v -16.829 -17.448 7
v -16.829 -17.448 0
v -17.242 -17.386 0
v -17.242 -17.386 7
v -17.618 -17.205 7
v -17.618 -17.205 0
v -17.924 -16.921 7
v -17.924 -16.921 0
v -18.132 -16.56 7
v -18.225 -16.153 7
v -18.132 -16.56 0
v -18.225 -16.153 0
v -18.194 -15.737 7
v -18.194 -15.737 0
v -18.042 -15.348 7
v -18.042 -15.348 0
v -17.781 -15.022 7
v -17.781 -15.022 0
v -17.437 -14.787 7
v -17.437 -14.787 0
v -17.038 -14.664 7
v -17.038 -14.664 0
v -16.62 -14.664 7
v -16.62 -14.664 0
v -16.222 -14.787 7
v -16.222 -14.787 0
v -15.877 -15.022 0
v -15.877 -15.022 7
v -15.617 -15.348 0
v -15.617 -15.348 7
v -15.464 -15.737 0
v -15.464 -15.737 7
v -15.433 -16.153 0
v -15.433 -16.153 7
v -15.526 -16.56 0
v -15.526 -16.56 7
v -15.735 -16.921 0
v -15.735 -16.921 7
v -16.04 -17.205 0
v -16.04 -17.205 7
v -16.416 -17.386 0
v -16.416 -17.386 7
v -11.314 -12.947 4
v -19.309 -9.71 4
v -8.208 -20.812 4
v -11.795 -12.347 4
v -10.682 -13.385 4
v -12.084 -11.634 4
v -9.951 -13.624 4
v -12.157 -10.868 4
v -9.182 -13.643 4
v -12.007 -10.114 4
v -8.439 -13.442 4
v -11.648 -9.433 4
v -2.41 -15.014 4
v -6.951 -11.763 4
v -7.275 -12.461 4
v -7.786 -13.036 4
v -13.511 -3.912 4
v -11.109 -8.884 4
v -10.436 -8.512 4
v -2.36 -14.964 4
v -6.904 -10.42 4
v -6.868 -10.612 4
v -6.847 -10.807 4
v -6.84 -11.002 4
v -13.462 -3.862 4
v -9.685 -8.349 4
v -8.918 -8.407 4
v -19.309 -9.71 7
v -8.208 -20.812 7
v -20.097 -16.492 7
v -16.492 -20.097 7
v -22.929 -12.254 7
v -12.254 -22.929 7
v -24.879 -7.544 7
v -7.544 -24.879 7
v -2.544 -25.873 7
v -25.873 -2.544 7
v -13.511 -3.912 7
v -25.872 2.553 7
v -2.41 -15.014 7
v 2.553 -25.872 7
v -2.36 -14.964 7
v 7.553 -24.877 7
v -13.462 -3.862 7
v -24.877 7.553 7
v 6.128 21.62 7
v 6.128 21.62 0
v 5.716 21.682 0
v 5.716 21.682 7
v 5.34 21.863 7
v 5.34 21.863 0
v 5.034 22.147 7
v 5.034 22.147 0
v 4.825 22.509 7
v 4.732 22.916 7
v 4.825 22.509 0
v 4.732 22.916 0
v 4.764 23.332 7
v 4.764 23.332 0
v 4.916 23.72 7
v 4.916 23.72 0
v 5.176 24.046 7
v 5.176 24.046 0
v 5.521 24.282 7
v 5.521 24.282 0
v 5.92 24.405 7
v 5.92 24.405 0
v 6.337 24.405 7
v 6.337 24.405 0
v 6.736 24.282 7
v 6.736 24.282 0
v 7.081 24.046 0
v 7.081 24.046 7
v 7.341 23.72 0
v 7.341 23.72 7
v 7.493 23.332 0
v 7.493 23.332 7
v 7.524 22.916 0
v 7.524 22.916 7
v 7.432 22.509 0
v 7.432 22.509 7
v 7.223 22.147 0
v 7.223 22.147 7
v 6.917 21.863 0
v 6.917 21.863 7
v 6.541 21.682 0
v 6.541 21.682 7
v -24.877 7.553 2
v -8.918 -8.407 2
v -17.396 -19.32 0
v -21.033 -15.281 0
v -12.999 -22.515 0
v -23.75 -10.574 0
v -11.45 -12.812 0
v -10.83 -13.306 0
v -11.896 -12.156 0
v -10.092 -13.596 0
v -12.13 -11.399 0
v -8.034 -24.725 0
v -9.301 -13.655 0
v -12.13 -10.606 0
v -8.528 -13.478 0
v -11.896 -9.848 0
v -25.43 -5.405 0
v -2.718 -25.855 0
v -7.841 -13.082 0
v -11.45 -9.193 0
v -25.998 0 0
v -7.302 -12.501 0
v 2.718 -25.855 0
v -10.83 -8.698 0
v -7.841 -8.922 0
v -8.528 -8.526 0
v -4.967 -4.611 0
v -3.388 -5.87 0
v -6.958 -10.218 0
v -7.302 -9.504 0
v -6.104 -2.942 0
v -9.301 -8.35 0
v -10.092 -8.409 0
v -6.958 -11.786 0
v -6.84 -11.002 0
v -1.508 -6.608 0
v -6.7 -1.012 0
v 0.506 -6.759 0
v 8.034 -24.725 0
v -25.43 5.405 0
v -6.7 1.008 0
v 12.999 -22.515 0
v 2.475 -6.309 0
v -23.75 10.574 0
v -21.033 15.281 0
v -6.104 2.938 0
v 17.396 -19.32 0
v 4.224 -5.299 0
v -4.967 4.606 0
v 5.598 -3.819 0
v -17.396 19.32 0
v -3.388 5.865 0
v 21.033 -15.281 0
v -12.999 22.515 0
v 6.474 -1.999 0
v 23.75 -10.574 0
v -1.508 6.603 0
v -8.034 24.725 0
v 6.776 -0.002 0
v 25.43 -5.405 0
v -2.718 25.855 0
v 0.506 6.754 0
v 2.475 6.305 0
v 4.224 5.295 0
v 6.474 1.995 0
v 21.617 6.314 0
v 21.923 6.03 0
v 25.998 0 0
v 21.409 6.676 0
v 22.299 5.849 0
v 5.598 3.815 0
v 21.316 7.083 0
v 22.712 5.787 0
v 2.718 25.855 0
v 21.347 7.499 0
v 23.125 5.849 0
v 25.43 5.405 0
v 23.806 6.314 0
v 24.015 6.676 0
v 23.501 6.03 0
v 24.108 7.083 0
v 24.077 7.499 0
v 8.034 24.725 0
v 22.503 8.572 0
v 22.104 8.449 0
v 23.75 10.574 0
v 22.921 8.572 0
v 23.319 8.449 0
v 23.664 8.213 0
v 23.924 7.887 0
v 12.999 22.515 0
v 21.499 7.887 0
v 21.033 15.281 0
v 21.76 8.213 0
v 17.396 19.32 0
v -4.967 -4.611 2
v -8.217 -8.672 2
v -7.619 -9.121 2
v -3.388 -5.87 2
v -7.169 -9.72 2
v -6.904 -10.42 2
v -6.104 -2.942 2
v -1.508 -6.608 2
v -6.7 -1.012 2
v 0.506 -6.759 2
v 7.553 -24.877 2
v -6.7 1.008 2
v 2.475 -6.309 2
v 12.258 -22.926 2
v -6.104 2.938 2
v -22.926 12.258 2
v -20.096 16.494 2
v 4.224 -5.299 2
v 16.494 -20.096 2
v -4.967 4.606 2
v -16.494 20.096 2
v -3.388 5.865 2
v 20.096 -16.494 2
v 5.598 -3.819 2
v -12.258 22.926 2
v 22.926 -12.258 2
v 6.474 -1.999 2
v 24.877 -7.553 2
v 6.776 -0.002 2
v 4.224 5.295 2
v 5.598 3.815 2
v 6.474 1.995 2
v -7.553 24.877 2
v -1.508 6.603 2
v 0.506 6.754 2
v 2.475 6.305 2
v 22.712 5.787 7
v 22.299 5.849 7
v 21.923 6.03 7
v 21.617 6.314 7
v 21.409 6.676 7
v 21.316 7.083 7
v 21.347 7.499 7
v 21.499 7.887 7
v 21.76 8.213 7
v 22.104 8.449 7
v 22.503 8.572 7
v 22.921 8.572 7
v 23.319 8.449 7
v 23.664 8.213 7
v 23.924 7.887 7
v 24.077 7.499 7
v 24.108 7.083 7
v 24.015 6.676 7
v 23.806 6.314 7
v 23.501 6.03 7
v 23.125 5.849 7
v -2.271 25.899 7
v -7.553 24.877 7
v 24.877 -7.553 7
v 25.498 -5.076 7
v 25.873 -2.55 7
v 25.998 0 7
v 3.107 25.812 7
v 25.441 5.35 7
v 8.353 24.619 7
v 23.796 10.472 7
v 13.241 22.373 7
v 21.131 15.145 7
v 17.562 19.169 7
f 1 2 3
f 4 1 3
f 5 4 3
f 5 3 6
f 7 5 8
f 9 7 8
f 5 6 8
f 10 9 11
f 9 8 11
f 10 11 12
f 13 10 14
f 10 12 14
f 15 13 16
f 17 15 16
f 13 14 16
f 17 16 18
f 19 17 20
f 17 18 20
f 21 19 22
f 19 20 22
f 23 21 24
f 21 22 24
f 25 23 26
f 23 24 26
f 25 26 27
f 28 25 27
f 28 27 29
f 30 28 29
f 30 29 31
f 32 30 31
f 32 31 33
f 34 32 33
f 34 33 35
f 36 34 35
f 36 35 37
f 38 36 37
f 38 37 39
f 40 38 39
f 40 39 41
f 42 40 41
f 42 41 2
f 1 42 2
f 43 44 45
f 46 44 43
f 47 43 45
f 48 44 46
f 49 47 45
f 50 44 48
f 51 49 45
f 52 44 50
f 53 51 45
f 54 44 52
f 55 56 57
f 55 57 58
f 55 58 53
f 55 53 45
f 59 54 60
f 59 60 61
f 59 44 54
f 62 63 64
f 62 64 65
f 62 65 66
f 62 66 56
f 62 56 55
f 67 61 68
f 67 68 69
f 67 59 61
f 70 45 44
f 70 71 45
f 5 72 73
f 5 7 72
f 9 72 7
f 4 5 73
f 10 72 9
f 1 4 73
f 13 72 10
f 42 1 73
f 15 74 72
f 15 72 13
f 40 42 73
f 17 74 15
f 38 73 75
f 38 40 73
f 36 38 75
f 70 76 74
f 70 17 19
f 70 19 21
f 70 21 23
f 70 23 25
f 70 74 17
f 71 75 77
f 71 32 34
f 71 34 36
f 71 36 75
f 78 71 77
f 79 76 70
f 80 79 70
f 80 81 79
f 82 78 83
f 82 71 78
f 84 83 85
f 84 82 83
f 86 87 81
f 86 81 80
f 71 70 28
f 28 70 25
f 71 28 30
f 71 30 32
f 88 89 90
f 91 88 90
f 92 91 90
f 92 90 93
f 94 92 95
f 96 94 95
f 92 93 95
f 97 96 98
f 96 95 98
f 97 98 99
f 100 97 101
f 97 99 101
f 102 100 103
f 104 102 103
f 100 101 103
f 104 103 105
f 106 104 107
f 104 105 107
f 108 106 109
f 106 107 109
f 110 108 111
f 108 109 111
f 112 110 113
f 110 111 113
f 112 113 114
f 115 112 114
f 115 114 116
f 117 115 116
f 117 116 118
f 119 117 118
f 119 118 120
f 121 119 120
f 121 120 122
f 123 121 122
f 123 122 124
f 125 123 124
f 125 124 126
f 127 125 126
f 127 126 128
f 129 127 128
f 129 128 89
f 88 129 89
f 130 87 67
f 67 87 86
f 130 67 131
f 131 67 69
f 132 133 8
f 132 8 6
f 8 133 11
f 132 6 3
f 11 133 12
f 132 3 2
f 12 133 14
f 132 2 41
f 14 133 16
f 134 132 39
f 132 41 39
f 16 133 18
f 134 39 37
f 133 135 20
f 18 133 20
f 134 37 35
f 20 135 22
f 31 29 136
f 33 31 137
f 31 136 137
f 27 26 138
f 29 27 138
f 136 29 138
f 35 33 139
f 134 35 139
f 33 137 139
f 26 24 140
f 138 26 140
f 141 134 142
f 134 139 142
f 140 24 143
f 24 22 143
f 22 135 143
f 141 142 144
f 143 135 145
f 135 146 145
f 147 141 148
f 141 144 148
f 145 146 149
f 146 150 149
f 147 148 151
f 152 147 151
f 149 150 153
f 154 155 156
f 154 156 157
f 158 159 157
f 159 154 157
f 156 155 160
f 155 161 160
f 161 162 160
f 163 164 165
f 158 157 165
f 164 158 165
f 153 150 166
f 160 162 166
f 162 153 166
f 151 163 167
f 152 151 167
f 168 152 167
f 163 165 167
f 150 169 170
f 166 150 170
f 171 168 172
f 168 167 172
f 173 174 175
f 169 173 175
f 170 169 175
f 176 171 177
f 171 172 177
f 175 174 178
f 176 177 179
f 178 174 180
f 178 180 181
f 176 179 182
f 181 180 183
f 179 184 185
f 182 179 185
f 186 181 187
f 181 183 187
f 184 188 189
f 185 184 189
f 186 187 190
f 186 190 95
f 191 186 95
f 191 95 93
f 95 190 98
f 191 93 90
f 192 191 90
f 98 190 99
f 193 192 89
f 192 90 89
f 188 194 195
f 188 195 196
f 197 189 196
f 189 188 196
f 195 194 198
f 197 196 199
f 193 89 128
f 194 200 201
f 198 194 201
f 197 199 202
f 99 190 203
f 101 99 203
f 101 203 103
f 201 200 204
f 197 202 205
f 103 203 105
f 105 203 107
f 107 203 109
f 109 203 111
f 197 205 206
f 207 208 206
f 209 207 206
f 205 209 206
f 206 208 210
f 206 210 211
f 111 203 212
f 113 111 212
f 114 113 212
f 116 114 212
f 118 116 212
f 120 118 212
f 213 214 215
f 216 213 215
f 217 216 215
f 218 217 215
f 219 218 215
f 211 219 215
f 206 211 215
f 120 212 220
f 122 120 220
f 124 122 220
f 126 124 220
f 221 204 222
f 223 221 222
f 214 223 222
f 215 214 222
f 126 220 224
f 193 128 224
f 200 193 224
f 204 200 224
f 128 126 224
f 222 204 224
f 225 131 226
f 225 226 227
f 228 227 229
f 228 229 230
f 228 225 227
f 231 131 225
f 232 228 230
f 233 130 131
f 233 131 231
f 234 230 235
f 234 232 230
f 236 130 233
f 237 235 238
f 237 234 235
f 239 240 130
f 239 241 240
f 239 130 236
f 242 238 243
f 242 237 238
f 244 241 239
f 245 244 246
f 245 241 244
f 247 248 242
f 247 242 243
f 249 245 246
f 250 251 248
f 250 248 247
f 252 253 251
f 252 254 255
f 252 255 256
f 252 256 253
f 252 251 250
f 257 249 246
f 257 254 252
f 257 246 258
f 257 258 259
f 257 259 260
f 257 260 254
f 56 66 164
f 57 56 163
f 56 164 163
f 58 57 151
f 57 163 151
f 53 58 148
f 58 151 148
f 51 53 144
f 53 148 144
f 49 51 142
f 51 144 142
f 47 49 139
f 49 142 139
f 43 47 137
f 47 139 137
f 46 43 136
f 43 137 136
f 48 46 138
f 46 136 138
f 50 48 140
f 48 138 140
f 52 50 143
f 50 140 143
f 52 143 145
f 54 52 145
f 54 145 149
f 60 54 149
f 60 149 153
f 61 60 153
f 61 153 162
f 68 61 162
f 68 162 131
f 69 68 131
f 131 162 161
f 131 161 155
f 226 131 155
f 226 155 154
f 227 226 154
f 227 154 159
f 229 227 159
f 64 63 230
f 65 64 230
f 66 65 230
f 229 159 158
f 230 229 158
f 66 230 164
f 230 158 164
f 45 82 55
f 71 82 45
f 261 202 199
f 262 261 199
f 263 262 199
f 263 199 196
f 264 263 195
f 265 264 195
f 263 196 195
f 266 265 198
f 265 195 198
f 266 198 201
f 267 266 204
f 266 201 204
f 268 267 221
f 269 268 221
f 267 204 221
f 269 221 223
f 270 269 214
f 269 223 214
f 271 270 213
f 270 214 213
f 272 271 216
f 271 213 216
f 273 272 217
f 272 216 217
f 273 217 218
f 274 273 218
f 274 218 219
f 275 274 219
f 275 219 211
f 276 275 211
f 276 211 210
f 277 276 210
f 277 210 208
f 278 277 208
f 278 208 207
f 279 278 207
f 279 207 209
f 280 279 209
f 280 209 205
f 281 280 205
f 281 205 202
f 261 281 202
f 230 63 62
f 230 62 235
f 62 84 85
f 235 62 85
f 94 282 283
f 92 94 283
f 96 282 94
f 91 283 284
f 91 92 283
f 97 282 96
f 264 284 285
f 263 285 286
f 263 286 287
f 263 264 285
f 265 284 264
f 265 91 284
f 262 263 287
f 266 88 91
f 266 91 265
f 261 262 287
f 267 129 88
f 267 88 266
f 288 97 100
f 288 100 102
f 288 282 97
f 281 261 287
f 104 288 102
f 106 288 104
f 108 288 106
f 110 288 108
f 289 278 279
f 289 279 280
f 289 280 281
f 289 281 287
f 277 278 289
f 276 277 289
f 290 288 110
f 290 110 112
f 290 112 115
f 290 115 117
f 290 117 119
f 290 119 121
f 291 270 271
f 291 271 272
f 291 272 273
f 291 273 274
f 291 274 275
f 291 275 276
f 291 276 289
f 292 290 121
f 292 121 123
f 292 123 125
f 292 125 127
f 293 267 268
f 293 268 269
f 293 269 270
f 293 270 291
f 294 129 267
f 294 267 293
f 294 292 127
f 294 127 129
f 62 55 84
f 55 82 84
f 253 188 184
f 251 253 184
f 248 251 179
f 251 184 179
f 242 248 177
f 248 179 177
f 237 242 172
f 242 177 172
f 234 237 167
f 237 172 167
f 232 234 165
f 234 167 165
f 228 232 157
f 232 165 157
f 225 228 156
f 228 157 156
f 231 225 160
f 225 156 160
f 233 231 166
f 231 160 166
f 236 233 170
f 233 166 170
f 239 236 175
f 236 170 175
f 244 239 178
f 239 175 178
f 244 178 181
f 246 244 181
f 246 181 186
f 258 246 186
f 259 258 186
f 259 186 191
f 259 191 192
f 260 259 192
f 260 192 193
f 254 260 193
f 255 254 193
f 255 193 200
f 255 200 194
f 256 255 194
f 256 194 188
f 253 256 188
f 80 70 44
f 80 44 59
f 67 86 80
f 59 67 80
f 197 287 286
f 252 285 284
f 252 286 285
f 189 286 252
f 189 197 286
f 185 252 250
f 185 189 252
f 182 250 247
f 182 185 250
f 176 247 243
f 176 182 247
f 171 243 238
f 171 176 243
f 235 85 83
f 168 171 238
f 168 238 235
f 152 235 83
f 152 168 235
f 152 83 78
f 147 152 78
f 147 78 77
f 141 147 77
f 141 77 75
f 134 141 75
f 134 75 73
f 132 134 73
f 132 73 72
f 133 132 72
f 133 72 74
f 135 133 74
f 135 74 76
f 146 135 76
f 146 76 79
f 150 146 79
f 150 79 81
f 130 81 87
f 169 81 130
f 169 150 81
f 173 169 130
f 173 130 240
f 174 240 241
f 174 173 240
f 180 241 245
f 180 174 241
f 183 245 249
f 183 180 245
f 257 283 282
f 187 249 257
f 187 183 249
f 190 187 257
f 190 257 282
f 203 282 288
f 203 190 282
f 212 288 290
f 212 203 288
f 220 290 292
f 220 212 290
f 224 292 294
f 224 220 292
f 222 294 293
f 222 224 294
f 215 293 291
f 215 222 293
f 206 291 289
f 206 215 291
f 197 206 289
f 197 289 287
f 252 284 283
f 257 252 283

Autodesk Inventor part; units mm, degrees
ref_plane "YZ Plane" through (0, 0, 0) normal (1, 0, 0) x (0, 1, 0)
ref_plane "XZ Plane" through (0, 0, 0) normal (0, 1, 0) x (-1, 0, 0)
ref_plane "XY Plane" through (0, 0, 0) normal (0, 0, 1) x (1, 0, 0)
ref_plane "Work Plane1" through (0, 0, 0) normal (0, 0, 1) x (1, 0, 0)
sketch "Sketch1" plane through (0, 0, 0) normal (0, 0, 1) x (1, 0, 0)
  circle A0 centre (0, 0) radius 25.9979 projected
  circle A1 centre (-9.4998, -11.0022) radius 2.6601 projected
  circle A2 centre (0.0001, -0.0022) radius 3.8801 projected
  circle A3 centre (0.0001, -0.0022) radius 6.7754 projected
  point P0 (0, 0)
extrude "Extrusion1" add sketch "Sketch1" along normal blind 7 contours A0
sketch "Sketch2" plane through (0, 0, 7) normal (0, 0, 1) x (1, 0, 0)
  line L0 (32.4435, -15.1193) -> (-15.1193, 32.4435)
  line L1 (-15.1193, 32.4435) -> (-32.4435, 15.1193)
  line L2 (-32.4435, 15.1193) -> (15.1193, -32.4435)
  line L3 (15.1193, -32.4435) -> (32.4435, -15.1193)
  line L4 (32.4435, -15.1193) -> (-32.4435, 15.1193) construction
  line L5 (-15.1193, 32.4435) -> (15.1193, -32.4435) construction
  line L6 (32.4435, -15.1193) -> (99.7074, -15.1193) construction
  point P0 (0, 0)
  dimension "d2" = 135
  dimension "d3" = 24.5
extrude "Extrusion2" cut sketch "Sketch2" against normal blind 5
sketch "Sketch3" plane through (0, 0, 7) normal (0, 0, 1) x (1, 0, 0)
  line L0 (-7.7936, -20.2561) -> (-2.9652, -15.4277) projected
  line L1 (-18.7537, -9.2959) -> (-13.9253, -4.4675) projected
  line L2 (-13.5111, -3.9119) -> (-2.4095, -15.0135)
  line L3 (-2.4095, -15.0135) -> (-8.2078, -20.8117)
  line L4 (-8.2078, -20.8117) -> (-19.3094, -9.7102)
  line L5 (-19.3094, -9.7102) -> (-13.5111, -3.9119)
  line L6 (-8.9176, -8.4066) -> (-24.8767, 7.5526) projected
  line L7 (-13.4617, -3.8624) -> (-2.4095, -15.0135)
  line L8 (-2.4095, -15.0135) -> (-0.3384, -12.9607)
  line L9 (-0.3384, -12.9607) -> (-11.3905, -1.8096)
  line L10 (-11.3905, -1.8096) -> (-13.4617, -3.8624)
  line L11 (-13.4617, -3.8624) -> (-13.5111, -3.9119)
  line L12 (-8.9176, -8.4066) -> (-24.8767, 7.5526) projected
  line L13 (-13.9253, -4.4675) -> (-2.9652, -15.4277) projected
  line L14 (-7.7936, -20.2561) -> (-18.7537, -9.2959) projected
  point P0 (0, 0)
  dimension "d6" = 0.1
extrude "Extrusion3" cut sketch "Sketch3" against normal blind 3 contours L14 L1 L13 L0 | L11 L7 L2 | L2 L3 L4 L5 | L7 L10 L9 L8
sketch "Skizze4" plane through (0, 0, 7) normal (0, 0, 1) x (1, 0, 0)
  spline S0 degree 2 poles (24.1427, 2.2394) (24.731, 1.8489) (25.3785, 0.5587) (25.3785, -0.3311) knots 0 0 0 1 2 2 2 construction
  spline S1 degree 2 poles (25.3785, -0.3311) (25.3785, -1.1665) (24.7013, -2.5111) (24.1328, -2.8867) knots 0 0 0 1 2 2 2 construction
  spline S2 degree 2 poles (24.1328, -2.8867) (23.6682, -3.1784) (22.7141, -3.3761) (21.9726, -3.3761) knots 0 0 0 1 2 2 2 construction
  line L0 (21.9726, -3.3761) -> (20.5687, -3.3761) construction
  line L1 (20.5687, -3.3761) -> (20.5687, 2.7239) construction
  line L2 (20.5687, 2.7239) -> (21.9578, 2.7239) construction
  spline S3 degree 2 poles (21.9578, 2.7239) (22.8179, 2.7239) (23.7967, 2.4668) (24.1427, 2.2394) knots 0 0 0 1 2 2 2 construction
  spline S4 degree 2 poles (19.1896, -2.9312) (18.8979, -3.1982) (18.1564, -3.4849) (17.5978, -3.4849) knots 0 0 0 1 2 2 2 construction
  spline S5 degree 2 poles (17.5978, -3.4849) (16.9354, -3.4849) (16.0061, -3.2081) (15.5958, -3.0103) knots 0 0 0 1 2 2 2 construction
  line L3 (15.5958, -3.0103) -> (15.5958, -1.992) construction
  line L4 (15.5958, -1.992) -> (15.6551, -1.992) construction
  spline S6 degree 2 poles (15.6551, -1.992) (16.0555, -2.3677) (17.0689, -2.7829) (17.5385, -2.7829) knots 0 0 0 1 2 2 2 construction
  spline S7 degree 2 poles (17.5385, -2.7829) (18.2108, -2.7829) (18.8979, -2.2243) (18.8979, -1.7646) knots 0 0 0 1 2 2 2 construction
  spline S8 degree 2 poles (18.8979, -1.7646) (18.8979, -1.3988) (18.5371, -0.944) (18.1465, -0.8303) knots 0 0 0 1 2 2 2 construction
  spline S9 degree 2 poles (18.1465, -0.8303) (17.8648, -0.7513) (17.3952, -0.6425) (17.0442, -0.5535) knots 0 0 0 1 2 2 2 construction
  spline S10 degree 2 poles (17.0442, -0.5535) (16.7278, -0.4695) (16.2285, -0.2174) (16.0358, -0.0147) knots 0 0 0 1 2 2 2 construction
  spline S11 degree 2 poles (16.0358, -0.0147) (15.8479, 0.188) (15.6403, 0.7317) (15.6403, 1.0876) knots 0 0 0 1 2 2 2 construction
  spline S12 degree 2 poles (15.6403, 1.0876) (15.6403, 1.8291) (16.797, 2.8326) (17.6918, 2.8326) knots 0 0 0 1 2 2 2 construction
  spline S13 degree 2 poles (17.6918, 2.8326) (18.2059, 2.8326) (19.1154, 2.6299) (19.5059, 2.4372) knots 0 0 0 1 2 2 2 construction
  line L5 (19.5059, 2.4372) -> (19.5059, 1.4683) construction
  line L6 (19.5059, 1.4683) -> (19.4466, 1.4683) construction
  spline S14 degree 2 poles (19.4466, 1.4683) (19.155, 1.7352) (18.2454, 2.1307) (17.7461, 2.1307) knots 0 0 0 1 2 2 2 construction
  spline S15 degree 2 poles (17.7461, 2.1307) (17.1826, 2.1307) (16.4856, 1.6017) (16.4856, 1.1717) knots 0 0 0 1 2 2 2 construction
  spline S16 degree 2 poles (16.4856, 1.1717) (16.4856, 0.7861) (16.8959, 0.3264) (17.2815, 0.2226) knots 0 0 0 1 2 2 2 construction
  spline S17 degree 2 poles (17.2815, 0.2226) (17.5385, 0.1534) (18.285, -0.0246) (18.5321, -0.0987) knots 0 0 0 1 2 2 2 construction
  spline S18 degree 2 poles (18.5321, -0.0987) (19.1599, -0.2915) (19.7432, -1.0676) (19.7432, -1.6361) knots 0 0 0 1 2 2 2 construction
  spline S19 degree 2 poles (19.7432, -1.6361) (19.7432, -1.997) (19.4516, -2.689) (19.1896, -2.9312) knots 0 0 0 1 2 2 2 construction
  circle A0 centre (-9.9998, 17.4978) radius 1.3999 construction
  circle A1 centre (10.0001, 17.4979) radius 1.4 construction
  circle A2 centre (10.0001, -17.5021) radius 1.4 construction
  circle A3 centre (-9.9998, -17.5021) radius 1.4001 construction
  arc A4 (-25.1198, 6.6998) -> (-24.1417, 5.4917) centre (-24.1417, 6.4917) ccw construction
  line L7 (-24.1417, 5.4917) -> (-17.7002, 5.4917) construction
  arc A5 (-15.7002, 3.4917) -> (-17.7002, 5.4917) centre (-17.7002, 3.4917) ccw construction
  line L8 (-15.7002, 3.4917) -> (-15.7002, -4.496) construction
  arc A6 (-17.7002, -6.496) -> (-15.7002, -4.496) centre (-17.7002, -4.496) ccw construction
  line L9 (-17.7002, -6.496) -> (-23.8502, -6.496) construction
  arc A7 (-23.8502, -6.496) -> (-24.8235, -7.7254) centre (-23.8502, -7.496) ccw construction
  arc A8 (-24.8235, -7.7254) -> (-25.1198, 6.6998) centre (0, 0) ccw construction
  circle A9 centre (-9.4998, -11.0022) radius 2.6601 construction
  circle A10 centre (-16.8291, -16.0482) radius 1.4 construction
  circle A11 centre (6.1284, 23.0202) radius 1.4 construction
  circle A12 centre (22.7119, 7.1872) radius 1.4 construction
  circle A13 centre (0.0001, -0.0022) radius 6.5 construction
  point P0 (0, 0)
hole "Bohrung1" at (6.1284, 23.0202, 7) at (22.7119, 7.1872, 7) at (-16.8291, -16.0482, 7) direction (0, 0, -1) diameter 2.8 end through all
properties part number "Matchboxscope_sample_v1"
